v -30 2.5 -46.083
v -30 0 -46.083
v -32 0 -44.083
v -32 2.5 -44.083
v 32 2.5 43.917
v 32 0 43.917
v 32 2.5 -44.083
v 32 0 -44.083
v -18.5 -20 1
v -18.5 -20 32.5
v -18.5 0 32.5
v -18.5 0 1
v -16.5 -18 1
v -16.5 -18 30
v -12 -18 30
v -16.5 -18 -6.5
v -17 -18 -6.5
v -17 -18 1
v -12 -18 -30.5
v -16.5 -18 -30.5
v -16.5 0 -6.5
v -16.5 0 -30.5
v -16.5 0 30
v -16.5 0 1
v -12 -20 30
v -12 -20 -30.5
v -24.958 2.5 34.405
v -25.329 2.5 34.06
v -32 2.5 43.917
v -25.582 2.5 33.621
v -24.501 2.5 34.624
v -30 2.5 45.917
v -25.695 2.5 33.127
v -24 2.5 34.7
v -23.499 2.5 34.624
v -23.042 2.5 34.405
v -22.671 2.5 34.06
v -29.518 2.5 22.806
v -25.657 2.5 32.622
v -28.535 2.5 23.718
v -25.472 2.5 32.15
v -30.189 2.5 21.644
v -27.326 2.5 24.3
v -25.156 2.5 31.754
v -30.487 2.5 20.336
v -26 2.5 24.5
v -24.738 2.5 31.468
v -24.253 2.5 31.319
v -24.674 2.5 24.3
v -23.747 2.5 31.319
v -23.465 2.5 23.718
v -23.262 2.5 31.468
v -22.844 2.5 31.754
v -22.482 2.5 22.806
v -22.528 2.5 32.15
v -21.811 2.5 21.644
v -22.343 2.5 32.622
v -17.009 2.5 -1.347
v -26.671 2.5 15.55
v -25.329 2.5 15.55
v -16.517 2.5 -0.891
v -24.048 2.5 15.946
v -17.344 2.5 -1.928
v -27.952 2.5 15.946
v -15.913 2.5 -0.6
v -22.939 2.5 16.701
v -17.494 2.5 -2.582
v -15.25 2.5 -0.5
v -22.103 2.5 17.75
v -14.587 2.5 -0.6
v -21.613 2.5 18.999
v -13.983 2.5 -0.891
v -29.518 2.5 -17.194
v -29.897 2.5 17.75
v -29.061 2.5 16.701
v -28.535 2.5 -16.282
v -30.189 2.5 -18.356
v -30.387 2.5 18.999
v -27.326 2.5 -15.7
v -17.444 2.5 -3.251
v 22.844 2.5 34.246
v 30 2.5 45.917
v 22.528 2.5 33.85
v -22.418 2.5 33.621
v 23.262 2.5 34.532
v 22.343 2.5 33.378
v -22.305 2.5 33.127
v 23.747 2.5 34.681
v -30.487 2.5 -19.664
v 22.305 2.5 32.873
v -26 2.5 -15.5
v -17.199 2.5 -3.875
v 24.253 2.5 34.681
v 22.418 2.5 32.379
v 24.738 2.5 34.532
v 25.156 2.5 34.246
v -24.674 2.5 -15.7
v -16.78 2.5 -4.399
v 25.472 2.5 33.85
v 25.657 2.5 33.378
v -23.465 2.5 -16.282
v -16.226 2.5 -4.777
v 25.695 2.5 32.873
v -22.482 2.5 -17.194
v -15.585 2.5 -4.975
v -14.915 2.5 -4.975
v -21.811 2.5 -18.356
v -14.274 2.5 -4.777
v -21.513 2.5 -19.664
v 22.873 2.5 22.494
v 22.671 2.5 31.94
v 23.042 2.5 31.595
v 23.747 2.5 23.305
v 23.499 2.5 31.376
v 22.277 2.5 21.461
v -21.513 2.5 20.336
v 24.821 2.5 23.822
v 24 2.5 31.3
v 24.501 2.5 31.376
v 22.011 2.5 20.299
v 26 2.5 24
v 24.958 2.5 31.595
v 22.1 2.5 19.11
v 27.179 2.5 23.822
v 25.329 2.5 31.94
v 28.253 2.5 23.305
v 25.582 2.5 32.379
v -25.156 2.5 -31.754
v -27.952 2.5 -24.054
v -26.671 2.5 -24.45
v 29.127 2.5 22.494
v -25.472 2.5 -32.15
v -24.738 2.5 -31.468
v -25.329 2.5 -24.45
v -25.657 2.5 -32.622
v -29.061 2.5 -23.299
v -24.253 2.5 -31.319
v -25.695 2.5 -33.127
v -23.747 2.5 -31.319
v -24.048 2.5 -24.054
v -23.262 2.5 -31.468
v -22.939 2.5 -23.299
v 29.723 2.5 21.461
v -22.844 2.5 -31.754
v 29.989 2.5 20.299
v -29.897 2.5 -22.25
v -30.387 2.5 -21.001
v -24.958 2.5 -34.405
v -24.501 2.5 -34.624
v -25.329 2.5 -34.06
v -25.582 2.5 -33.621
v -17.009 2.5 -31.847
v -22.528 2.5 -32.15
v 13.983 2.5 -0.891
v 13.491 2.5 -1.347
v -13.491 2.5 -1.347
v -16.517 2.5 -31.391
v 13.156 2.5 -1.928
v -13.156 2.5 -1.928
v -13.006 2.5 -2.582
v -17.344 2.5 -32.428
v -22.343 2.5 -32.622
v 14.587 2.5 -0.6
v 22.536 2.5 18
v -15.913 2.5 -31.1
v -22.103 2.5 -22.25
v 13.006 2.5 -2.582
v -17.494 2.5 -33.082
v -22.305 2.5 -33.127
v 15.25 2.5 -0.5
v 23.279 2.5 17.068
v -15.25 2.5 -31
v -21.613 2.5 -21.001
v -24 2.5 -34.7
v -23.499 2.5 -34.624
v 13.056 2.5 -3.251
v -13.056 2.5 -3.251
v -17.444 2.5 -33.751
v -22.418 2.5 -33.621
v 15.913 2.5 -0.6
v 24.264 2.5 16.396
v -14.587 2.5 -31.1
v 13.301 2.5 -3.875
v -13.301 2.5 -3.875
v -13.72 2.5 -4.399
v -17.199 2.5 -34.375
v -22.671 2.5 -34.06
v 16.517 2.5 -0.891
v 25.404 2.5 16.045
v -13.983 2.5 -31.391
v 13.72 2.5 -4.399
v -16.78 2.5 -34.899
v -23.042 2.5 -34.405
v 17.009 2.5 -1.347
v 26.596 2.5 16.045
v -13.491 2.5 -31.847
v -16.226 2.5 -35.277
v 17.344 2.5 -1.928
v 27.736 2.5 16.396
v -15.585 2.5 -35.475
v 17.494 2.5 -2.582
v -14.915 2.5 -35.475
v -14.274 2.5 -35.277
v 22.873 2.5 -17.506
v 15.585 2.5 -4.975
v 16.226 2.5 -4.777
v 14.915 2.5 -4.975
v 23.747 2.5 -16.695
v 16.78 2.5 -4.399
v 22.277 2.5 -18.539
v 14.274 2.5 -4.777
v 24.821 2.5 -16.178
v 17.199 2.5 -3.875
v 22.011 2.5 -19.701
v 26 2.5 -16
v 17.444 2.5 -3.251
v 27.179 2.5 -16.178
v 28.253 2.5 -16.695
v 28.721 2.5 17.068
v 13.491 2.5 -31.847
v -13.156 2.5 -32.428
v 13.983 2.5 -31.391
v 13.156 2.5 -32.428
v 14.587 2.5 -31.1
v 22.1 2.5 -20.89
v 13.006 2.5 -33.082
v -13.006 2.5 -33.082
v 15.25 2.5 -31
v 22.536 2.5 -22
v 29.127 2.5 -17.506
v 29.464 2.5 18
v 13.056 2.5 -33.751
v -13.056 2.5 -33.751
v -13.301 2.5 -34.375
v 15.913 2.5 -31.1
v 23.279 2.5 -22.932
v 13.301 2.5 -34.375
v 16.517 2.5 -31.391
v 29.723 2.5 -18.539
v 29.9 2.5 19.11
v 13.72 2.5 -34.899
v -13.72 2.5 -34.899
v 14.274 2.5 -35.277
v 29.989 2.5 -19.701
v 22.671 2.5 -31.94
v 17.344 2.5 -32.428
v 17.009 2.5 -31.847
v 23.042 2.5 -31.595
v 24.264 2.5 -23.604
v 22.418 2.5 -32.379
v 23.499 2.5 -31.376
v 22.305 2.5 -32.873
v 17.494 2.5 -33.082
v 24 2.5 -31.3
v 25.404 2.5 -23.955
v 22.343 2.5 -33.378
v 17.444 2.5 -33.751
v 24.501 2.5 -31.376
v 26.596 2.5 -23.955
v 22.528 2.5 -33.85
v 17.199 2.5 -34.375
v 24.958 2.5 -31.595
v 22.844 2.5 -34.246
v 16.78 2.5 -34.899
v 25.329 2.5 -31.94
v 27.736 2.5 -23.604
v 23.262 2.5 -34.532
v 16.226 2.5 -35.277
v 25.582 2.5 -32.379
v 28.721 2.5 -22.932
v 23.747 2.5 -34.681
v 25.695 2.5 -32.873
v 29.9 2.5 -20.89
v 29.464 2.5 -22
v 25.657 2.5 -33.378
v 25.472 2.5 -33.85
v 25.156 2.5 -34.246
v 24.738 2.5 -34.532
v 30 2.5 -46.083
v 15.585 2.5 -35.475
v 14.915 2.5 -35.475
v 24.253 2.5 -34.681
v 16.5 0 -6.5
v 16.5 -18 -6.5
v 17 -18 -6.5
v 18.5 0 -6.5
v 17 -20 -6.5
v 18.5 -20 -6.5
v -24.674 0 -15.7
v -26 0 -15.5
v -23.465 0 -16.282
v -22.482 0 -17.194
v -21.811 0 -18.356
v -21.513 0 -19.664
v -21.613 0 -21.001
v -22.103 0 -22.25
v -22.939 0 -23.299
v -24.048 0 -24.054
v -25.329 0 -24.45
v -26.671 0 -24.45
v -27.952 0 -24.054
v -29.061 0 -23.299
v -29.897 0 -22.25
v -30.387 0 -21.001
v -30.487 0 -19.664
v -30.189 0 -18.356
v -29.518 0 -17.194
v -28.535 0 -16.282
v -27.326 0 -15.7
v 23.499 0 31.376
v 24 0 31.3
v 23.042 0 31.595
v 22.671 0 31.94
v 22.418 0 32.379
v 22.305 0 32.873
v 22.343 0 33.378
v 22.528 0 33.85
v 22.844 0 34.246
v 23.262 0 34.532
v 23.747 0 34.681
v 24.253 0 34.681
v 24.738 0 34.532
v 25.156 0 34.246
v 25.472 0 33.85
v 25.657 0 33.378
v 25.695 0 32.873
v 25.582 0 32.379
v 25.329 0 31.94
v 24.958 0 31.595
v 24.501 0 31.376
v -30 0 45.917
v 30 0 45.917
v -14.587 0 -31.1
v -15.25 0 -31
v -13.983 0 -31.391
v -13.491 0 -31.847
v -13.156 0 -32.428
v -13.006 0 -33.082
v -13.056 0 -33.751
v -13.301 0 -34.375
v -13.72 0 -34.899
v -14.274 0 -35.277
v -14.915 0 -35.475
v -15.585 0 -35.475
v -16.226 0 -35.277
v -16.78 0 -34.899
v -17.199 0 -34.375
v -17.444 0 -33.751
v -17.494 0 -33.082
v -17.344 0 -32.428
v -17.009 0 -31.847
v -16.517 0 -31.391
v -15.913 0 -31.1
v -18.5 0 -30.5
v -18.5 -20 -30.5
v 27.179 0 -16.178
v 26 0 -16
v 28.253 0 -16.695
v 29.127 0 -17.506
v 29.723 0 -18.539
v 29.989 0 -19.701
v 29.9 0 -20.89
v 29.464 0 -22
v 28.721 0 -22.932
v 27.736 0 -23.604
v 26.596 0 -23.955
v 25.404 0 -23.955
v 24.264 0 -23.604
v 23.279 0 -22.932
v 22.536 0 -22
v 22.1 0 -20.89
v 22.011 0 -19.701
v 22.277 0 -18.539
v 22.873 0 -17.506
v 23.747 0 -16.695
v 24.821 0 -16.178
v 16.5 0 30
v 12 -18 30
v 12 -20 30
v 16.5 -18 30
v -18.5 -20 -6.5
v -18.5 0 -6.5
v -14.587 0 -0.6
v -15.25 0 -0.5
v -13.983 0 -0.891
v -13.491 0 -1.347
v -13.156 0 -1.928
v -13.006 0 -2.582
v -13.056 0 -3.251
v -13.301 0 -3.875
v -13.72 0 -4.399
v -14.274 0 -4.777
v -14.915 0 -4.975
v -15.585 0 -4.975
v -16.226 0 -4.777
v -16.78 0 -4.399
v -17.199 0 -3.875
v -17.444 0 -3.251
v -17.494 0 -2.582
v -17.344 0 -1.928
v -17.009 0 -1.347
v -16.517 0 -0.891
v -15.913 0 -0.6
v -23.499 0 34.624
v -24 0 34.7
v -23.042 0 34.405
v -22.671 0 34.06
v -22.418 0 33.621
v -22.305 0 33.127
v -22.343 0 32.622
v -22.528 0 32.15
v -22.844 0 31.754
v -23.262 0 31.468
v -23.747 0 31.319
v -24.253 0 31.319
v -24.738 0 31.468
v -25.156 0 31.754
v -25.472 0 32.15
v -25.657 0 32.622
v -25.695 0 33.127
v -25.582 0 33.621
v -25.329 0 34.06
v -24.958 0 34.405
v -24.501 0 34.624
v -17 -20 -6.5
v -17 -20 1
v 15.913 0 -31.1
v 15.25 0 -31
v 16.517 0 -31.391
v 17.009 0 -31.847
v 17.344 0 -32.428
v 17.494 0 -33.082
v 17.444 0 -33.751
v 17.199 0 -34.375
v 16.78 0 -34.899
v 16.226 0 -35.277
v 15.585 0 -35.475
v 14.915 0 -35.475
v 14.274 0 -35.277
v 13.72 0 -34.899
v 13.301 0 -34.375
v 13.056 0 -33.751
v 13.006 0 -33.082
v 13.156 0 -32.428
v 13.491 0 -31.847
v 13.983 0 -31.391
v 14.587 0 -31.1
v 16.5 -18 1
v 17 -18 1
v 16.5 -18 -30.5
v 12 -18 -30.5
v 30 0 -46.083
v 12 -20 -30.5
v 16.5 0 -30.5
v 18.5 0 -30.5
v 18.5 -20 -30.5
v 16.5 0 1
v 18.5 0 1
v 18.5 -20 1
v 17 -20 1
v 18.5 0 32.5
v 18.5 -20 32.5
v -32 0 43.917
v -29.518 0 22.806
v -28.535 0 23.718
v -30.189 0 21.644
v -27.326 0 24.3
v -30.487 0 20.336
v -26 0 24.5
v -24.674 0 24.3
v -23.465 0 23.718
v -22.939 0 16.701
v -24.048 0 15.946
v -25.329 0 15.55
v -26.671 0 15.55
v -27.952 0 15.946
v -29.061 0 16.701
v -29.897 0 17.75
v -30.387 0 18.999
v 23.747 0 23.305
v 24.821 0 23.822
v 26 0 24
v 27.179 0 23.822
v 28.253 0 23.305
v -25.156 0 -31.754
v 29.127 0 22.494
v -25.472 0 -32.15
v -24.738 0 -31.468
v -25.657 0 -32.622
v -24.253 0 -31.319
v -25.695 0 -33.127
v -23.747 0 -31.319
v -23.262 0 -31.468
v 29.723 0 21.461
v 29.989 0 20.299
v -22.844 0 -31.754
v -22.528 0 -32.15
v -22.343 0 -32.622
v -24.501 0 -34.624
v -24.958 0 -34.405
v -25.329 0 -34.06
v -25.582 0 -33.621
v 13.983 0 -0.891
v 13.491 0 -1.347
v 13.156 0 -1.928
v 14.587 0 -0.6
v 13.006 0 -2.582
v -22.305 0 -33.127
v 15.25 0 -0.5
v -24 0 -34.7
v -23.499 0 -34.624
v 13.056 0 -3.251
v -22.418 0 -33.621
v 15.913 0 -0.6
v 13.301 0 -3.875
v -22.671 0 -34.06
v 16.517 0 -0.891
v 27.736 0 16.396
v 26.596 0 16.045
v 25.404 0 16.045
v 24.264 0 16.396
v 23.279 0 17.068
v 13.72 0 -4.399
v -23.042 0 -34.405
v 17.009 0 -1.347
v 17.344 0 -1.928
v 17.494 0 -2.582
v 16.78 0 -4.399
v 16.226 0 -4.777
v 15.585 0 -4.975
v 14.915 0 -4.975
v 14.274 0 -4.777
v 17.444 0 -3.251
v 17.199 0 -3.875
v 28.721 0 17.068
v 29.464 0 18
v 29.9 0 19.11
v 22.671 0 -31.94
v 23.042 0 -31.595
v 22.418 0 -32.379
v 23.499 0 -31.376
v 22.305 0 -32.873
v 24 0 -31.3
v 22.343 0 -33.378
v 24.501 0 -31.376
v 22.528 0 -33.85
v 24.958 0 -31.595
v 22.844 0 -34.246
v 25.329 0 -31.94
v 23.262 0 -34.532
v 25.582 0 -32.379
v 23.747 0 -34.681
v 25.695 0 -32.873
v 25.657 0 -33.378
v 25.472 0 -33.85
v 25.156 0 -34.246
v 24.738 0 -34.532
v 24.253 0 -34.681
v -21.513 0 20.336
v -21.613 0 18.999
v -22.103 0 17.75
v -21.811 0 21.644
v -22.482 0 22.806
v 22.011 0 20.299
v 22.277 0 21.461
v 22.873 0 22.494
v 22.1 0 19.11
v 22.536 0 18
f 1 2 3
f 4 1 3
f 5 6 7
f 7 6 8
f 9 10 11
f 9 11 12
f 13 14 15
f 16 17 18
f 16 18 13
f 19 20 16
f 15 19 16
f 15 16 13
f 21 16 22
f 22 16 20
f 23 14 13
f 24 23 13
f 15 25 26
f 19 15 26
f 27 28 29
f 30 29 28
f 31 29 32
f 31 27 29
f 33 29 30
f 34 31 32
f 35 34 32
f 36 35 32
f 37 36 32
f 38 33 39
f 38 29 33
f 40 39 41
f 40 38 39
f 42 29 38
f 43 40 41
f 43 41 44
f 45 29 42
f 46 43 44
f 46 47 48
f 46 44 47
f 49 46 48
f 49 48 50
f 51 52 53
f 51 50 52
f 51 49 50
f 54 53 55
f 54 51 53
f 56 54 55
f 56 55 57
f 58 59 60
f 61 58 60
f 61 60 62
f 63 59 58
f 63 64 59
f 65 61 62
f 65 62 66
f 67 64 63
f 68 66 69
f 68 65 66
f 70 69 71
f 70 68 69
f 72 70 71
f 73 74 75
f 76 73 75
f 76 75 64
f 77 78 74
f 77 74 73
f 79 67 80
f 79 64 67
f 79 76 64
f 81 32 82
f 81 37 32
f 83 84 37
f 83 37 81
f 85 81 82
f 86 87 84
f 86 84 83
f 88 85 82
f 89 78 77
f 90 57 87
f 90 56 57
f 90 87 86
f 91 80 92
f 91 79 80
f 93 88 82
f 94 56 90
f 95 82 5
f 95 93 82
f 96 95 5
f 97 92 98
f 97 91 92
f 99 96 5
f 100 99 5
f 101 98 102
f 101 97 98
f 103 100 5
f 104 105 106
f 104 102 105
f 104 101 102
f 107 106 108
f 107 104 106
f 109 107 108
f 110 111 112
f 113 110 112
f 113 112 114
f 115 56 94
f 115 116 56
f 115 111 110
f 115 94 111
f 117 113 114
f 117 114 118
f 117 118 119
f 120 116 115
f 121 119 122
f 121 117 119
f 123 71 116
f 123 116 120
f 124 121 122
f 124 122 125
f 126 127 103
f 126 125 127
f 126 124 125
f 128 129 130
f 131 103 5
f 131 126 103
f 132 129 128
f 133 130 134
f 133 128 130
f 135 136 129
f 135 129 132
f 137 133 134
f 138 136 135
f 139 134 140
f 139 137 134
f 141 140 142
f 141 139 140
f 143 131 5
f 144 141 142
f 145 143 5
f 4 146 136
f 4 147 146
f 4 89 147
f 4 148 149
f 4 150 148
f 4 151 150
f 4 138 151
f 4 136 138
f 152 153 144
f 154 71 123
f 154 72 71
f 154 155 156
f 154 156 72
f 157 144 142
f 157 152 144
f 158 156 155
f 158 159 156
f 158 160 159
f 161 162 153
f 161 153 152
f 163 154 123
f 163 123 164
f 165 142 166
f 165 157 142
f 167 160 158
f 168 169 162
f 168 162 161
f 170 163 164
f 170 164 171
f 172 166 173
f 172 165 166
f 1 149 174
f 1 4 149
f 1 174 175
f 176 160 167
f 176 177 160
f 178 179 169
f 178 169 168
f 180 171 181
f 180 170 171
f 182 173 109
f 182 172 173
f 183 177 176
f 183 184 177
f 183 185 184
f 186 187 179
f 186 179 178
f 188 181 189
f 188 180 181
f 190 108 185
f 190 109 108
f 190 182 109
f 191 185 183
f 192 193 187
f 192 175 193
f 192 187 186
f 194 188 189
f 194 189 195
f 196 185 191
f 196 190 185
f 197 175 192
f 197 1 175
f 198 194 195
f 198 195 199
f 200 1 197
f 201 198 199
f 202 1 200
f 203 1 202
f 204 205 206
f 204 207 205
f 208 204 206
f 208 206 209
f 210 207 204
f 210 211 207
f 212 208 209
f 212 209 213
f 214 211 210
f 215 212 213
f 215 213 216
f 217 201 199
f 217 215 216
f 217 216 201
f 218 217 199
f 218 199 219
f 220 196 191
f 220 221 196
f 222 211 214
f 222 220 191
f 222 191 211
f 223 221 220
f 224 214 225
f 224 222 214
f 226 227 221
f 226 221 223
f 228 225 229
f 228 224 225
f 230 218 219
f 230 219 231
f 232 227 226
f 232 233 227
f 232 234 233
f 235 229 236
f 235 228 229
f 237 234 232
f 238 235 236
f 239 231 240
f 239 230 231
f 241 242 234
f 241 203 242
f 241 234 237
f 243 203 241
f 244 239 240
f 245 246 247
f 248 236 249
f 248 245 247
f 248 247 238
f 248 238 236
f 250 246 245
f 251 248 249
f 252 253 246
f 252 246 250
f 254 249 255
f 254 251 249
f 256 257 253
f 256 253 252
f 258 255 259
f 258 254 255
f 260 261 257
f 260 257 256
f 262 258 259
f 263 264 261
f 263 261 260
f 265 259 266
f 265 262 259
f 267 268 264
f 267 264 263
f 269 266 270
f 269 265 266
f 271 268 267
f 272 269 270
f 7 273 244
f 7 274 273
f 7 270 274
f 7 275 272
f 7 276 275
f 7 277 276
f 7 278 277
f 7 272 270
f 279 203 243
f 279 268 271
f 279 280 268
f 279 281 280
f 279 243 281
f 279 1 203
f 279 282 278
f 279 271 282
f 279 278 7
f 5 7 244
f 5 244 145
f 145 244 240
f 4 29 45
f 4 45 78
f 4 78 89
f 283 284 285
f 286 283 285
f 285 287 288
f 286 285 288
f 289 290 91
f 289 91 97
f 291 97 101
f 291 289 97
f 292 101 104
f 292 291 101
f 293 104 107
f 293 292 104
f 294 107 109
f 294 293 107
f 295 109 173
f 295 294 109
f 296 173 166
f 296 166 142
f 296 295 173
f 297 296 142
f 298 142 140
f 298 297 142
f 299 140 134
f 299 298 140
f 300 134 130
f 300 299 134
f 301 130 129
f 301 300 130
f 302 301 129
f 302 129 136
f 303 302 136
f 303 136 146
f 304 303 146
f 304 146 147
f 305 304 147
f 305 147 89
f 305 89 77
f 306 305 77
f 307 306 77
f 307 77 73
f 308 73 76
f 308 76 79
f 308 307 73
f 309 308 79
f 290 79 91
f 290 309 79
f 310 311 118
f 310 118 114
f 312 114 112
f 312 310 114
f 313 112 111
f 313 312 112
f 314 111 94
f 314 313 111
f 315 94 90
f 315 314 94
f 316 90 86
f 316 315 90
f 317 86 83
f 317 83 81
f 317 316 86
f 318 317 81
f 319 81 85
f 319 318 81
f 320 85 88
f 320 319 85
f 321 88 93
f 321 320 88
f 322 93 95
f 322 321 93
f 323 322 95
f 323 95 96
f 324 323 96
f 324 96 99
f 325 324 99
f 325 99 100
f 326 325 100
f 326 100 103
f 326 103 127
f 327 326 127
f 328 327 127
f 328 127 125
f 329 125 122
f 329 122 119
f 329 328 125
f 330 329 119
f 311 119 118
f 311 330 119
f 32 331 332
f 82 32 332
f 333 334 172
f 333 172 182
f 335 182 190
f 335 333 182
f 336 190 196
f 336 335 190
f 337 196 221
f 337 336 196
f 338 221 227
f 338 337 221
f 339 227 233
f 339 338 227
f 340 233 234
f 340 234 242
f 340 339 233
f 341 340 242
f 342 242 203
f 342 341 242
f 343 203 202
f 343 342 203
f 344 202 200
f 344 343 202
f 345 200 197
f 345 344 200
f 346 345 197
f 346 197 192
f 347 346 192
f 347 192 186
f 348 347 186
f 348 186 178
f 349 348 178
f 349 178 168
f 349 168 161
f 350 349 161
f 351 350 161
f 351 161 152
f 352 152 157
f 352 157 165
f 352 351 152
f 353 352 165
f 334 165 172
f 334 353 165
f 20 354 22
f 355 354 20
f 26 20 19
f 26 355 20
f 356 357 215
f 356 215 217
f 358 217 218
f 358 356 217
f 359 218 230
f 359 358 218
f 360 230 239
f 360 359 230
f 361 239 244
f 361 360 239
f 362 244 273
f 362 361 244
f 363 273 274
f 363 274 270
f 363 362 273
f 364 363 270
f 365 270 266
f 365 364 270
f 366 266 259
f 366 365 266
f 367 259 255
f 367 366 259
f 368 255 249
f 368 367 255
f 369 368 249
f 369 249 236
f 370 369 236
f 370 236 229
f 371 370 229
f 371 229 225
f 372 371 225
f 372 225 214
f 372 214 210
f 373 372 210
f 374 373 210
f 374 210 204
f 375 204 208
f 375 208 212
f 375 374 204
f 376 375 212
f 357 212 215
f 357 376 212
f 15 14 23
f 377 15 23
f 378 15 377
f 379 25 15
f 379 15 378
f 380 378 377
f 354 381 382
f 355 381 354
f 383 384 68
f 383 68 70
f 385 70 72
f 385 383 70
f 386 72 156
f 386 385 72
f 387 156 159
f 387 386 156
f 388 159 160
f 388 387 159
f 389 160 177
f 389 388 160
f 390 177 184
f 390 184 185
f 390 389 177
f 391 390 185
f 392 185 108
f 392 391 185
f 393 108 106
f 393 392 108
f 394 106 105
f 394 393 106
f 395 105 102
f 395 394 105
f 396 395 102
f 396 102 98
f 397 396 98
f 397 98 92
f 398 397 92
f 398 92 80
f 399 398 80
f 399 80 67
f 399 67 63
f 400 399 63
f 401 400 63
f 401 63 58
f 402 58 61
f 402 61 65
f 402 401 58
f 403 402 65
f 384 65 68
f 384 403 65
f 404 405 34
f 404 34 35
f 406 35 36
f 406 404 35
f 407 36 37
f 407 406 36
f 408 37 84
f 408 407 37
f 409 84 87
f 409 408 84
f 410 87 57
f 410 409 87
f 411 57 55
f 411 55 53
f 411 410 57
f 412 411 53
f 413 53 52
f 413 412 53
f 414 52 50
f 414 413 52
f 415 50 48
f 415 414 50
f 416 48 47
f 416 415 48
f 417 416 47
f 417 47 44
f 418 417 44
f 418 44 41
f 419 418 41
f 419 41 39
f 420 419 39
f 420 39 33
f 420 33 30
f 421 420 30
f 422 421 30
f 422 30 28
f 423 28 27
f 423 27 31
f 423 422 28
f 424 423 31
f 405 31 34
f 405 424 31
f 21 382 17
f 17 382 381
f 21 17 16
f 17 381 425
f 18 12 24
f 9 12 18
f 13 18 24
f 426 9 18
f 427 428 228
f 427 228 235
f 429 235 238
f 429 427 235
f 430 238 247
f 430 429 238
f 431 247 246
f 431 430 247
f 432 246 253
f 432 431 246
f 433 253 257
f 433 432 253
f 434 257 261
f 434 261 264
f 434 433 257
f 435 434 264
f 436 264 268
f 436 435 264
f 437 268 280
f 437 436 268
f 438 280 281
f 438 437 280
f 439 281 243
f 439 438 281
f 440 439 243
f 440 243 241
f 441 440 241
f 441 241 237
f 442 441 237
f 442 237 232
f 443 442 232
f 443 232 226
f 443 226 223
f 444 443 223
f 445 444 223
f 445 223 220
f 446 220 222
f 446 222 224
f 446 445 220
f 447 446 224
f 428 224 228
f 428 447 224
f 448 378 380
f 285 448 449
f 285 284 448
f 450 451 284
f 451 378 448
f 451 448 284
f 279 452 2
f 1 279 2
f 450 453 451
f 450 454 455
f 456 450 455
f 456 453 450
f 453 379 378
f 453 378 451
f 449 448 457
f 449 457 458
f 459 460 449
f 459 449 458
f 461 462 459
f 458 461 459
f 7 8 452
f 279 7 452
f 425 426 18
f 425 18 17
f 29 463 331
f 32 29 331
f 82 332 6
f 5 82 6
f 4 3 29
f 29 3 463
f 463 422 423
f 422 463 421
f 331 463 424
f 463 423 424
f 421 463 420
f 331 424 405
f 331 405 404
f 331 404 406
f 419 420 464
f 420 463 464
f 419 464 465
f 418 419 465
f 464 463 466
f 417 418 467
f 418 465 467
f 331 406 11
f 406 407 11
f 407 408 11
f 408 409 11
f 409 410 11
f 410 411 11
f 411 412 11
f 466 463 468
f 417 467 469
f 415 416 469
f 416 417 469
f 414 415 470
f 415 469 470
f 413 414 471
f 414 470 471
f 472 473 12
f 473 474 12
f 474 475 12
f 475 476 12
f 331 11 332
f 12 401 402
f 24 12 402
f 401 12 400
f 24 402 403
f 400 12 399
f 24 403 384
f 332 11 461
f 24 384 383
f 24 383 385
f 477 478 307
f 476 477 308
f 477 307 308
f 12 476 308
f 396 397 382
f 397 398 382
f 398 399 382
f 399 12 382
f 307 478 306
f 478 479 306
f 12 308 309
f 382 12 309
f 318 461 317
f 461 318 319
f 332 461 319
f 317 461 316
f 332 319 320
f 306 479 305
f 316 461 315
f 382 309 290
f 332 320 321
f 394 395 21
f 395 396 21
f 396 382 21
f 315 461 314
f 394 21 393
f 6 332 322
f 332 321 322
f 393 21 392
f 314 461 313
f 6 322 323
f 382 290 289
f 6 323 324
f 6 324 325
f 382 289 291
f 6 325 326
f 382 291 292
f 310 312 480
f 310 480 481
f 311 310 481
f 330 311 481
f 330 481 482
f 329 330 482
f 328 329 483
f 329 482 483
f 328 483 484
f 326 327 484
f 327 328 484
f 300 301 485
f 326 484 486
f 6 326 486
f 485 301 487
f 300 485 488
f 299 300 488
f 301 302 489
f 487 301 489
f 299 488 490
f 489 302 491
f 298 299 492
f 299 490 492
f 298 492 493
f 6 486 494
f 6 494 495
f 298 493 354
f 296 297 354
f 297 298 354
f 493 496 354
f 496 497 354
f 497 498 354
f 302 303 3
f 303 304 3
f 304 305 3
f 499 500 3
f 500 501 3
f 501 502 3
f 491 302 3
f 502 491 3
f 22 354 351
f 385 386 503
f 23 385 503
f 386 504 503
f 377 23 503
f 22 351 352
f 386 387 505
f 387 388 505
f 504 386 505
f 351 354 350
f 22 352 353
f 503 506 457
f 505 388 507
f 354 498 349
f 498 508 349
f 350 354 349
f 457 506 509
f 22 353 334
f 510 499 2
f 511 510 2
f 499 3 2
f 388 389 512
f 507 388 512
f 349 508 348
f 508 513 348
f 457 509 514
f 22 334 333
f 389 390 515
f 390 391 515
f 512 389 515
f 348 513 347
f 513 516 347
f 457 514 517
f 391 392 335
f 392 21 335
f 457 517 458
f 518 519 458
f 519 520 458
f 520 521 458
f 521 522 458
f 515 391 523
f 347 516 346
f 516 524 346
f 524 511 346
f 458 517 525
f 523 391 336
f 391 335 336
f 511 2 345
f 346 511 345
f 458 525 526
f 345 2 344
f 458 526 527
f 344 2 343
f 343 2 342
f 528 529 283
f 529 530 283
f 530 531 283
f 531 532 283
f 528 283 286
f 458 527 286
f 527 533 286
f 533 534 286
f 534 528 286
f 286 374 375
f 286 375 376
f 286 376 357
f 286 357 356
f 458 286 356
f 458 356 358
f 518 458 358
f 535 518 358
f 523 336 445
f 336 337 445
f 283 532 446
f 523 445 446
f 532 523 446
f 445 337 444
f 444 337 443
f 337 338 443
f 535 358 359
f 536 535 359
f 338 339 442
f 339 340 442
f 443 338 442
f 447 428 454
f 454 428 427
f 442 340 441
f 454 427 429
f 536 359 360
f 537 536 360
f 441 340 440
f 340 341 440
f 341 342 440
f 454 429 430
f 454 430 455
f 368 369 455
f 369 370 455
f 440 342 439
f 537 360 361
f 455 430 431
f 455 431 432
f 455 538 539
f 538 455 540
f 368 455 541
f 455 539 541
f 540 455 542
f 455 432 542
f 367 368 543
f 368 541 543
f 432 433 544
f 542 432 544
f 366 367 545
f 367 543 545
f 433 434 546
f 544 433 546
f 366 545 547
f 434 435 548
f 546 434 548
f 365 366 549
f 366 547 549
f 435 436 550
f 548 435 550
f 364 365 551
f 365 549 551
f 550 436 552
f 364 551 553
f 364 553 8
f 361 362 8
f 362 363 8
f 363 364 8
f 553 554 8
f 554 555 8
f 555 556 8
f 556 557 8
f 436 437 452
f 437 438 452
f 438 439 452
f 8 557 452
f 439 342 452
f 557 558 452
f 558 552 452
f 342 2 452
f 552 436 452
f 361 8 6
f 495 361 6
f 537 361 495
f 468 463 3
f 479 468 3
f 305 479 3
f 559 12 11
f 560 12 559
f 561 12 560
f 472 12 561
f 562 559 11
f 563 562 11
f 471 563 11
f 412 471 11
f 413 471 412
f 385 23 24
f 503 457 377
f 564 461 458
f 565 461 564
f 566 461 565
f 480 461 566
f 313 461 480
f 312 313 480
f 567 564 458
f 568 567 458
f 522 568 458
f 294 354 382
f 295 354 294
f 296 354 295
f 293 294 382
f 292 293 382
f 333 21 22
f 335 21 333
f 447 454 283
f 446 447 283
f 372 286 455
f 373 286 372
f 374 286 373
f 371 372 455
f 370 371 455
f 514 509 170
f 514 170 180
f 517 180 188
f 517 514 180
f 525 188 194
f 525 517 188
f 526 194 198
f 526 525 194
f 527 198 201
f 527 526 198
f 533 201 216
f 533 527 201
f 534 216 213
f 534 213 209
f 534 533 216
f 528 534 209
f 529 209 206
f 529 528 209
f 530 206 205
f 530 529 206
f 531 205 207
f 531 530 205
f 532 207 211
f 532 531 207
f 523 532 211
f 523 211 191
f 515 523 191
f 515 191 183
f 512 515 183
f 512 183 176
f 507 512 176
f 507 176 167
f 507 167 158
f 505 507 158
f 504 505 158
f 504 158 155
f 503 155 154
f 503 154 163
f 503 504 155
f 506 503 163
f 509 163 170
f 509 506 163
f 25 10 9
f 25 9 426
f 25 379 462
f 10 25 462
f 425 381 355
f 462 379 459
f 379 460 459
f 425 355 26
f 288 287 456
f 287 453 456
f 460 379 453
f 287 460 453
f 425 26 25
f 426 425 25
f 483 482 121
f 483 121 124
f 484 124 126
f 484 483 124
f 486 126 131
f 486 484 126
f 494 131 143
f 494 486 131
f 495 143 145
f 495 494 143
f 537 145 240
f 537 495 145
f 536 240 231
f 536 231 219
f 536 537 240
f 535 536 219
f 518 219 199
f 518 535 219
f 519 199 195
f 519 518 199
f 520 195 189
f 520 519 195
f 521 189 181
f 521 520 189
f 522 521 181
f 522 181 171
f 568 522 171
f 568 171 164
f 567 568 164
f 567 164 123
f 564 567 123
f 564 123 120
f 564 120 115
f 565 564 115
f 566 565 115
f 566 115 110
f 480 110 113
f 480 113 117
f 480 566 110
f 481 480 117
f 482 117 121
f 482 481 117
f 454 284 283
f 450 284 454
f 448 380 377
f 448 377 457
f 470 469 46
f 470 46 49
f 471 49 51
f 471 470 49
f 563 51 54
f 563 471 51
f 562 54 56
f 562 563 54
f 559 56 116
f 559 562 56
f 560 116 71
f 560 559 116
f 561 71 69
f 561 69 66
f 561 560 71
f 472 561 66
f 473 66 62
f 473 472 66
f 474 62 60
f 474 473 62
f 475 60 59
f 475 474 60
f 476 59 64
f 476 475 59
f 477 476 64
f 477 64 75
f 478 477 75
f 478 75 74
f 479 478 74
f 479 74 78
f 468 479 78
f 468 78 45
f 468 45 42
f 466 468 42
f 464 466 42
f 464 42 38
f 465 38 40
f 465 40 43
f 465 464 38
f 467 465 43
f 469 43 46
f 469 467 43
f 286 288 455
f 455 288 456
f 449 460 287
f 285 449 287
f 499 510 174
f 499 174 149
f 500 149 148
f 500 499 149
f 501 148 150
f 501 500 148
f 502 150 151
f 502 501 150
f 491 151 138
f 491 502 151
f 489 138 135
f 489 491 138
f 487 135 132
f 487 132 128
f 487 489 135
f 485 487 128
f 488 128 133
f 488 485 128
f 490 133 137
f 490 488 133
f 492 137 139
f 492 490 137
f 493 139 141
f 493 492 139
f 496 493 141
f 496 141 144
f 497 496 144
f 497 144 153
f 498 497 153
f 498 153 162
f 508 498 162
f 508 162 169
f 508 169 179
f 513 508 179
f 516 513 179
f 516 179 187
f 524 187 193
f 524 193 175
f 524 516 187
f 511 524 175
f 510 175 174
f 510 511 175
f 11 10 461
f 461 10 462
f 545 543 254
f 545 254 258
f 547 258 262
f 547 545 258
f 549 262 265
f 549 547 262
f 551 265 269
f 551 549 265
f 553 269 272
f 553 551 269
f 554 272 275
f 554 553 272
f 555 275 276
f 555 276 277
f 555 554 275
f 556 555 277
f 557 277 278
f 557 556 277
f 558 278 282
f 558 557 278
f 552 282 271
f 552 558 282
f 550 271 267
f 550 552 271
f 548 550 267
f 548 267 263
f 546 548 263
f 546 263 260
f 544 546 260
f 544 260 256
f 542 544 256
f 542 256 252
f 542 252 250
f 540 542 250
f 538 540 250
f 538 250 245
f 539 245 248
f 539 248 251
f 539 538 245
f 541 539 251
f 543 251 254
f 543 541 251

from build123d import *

# Parameters (mm, degrees)
SKETCH_1_R        = 2.25
SKETCH_1_R_2      = 1.7
SKETCH_1_R_3      = 4.5
SKETCH_1_R_4      = 4
EXTRUDE_1_DEPTH   = 2.5
EXTRUDE_START     = -20
SKETCH_2_W        = 5
SKETCH_2_H        = 61
EXTRUDE_2_DEPTH   = 2
EXTRUDE_2_2_DEPTH = 2
SKETCH_3_W        = 2
SKETCH_3_H        = 29.5
SKETCH_3_H_2      = 24
EXTRUDE_3_DEPTH   = 20
SKETCH_4_W        = 37
SKETCH_4_H        = 2.5
EXTRUDE_4_DEPTH   = 20


with BuildPart() as part:
    # 草图1 → 凸台-拉伸1 (new body)
    with BuildSketch(Plane(origin=(0, 0, 0), x_dir=(1, 0, 0), z_dir=(0, 1, 0))):
        Polygon((-30, -45.917034388), (30, -45.917034388), (32, -43.917034388), (32, 44.082965612), (30, 46.082965612), (-30, 46.082965612), (-32, 44.082965612), (-32, -43.917034388), align=None)
        with Locations(Location((-15.25, 2.75, 0), (0, 0, 270))):
            Circle(SKETCH_1_R, mode=Mode.SUBTRACT)
        with Locations(Location((-15.25, 33.25, 0), (0, 0, 270))):
            Circle(SKETCH_1_R, mode=Mode.SUBTRACT)
        with Locations(Location((15.25, 2.75, 0), (0, 0, 270))):
            Circle(SKETCH_1_R, mode=Mode.SUBTRACT)
        with Locations(Location((15.25, 33.25, 0), (0, 0, 270))):
            Circle(SKETCH_1_R, mode=Mode.SUBTRACT)
        with Locations(Location((-24, -33, 0), (0, 0, 270))):
            Circle(SKETCH_1_R_2, mode=Mode.SUBTRACT)
        with Locations(Location((-26, -20, 0), (0, 0, 270))):
            Circle(SKETCH_1_R_3, mode=Mode.SUBTRACT)
        with Locations(Location((-26, 20, 0), (0, 0, 270))):
            Circle(SKETCH_1_R_3, mode=Mode.SUBTRACT)
        with Locations(Location((26, -20, 0), (0, 0, 270))):
            Circle(SKETCH_1_R_4, mode=Mode.SUBTRACT)
        with Locations(Location((26, 20, 0), (0, 0, 270))):
            Circle(SKETCH_1_R_4, mode=Mode.SUBTRACT)
        with Locations(Location((24, -33, 0), (0, 0, 90))):
            Circle(SKETCH_1_R_2, mode=Mode.SUBTRACT)
        with Locations(Location((24, 33, 0), (0, 0, 270))):
            Circle(SKETCH_1_R_2, mode=Mode.SUBTRACT)
        with Locations(Location((-24, 33, 0), (0, 0, 90))):
            Circle(SKETCH_1_R_2, mode=Mode.SUBTRACT)
    extrude(amount=EXTRUDE_1_DEPTH)



with BuildPart() as body_2:
    # 草图2 → 凸台-拉伸2 (new body)
    with BuildSketch(Plane(origin=(0, 0, 0), x_dir=(1, 0, 0), z_dir=(0, 1, 0)).offset(EXTRUDE_START)):
        with Locations((14.5, 0)):
            Rectangle(SKETCH_2_W, SKETCH_2_H)
    extrude(amount=EXTRUDE_2_DEPTH)


with BuildPart() as body_3:
    # 草图2 → Extrude 2 2 (new body)
    with BuildSketch(Plane(origin=(0, 0, 0), x_dir=(1, 0, 0), z_dir=(0, 1, 0)).offset(EXTRUDE_START)):
        with Locations((-14.5, 0)):
            Rectangle(SKETCH_2_W, SKETCH_2_H)
    extrude(amount=EXTRUDE_2_2_DEPTH)


with BuildPart() as part_1:
    add(part.part)

    add(body_2.part)  # 凸台-拉伸3 merges body 2

    add(body_3.part)  # 凸台-拉伸3 merges body 3
    # 草图3 → 凸台-拉伸3 (add)
    with BuildSketch(Plane(origin=(0, 0, 0), x_dir=(1, 0, 0), z_dir=(0, 1, 0)).offset(EXTRUDE_START)):
        with Locations((17.5, -15.75)):
            Rectangle(SKETCH_3_W, SKETCH_3_H)
        with Locations((-17.5, -15.75)):
            Rectangle(SKETCH_3_W, SKETCH_3_H)
        with Locations((17.5, 18.5)):
            Rectangle(SKETCH_3_W, SKETCH_3_H_2)
        with Locations((-17.5, 18.5)):
            Rectangle(SKETCH_3_W, SKETCH_3_H_2)
    extrude(amount=EXTRUDE_3_DEPTH)

    # 草图4 → 凸台-拉伸4 (add)
    with BuildSketch(Plane(origin=(0, 0, 0), x_dir=(1, 0, 0), z_dir=(0, 1, 0)).offset(EXTRUDE_START)):
        with Locations((0, -31.25)):
            Rectangle(SKETCH_4_W, SKETCH_4_H)
    extrude(amount=EXTRUDE_4_DEPTH)


solid = part_1.part
